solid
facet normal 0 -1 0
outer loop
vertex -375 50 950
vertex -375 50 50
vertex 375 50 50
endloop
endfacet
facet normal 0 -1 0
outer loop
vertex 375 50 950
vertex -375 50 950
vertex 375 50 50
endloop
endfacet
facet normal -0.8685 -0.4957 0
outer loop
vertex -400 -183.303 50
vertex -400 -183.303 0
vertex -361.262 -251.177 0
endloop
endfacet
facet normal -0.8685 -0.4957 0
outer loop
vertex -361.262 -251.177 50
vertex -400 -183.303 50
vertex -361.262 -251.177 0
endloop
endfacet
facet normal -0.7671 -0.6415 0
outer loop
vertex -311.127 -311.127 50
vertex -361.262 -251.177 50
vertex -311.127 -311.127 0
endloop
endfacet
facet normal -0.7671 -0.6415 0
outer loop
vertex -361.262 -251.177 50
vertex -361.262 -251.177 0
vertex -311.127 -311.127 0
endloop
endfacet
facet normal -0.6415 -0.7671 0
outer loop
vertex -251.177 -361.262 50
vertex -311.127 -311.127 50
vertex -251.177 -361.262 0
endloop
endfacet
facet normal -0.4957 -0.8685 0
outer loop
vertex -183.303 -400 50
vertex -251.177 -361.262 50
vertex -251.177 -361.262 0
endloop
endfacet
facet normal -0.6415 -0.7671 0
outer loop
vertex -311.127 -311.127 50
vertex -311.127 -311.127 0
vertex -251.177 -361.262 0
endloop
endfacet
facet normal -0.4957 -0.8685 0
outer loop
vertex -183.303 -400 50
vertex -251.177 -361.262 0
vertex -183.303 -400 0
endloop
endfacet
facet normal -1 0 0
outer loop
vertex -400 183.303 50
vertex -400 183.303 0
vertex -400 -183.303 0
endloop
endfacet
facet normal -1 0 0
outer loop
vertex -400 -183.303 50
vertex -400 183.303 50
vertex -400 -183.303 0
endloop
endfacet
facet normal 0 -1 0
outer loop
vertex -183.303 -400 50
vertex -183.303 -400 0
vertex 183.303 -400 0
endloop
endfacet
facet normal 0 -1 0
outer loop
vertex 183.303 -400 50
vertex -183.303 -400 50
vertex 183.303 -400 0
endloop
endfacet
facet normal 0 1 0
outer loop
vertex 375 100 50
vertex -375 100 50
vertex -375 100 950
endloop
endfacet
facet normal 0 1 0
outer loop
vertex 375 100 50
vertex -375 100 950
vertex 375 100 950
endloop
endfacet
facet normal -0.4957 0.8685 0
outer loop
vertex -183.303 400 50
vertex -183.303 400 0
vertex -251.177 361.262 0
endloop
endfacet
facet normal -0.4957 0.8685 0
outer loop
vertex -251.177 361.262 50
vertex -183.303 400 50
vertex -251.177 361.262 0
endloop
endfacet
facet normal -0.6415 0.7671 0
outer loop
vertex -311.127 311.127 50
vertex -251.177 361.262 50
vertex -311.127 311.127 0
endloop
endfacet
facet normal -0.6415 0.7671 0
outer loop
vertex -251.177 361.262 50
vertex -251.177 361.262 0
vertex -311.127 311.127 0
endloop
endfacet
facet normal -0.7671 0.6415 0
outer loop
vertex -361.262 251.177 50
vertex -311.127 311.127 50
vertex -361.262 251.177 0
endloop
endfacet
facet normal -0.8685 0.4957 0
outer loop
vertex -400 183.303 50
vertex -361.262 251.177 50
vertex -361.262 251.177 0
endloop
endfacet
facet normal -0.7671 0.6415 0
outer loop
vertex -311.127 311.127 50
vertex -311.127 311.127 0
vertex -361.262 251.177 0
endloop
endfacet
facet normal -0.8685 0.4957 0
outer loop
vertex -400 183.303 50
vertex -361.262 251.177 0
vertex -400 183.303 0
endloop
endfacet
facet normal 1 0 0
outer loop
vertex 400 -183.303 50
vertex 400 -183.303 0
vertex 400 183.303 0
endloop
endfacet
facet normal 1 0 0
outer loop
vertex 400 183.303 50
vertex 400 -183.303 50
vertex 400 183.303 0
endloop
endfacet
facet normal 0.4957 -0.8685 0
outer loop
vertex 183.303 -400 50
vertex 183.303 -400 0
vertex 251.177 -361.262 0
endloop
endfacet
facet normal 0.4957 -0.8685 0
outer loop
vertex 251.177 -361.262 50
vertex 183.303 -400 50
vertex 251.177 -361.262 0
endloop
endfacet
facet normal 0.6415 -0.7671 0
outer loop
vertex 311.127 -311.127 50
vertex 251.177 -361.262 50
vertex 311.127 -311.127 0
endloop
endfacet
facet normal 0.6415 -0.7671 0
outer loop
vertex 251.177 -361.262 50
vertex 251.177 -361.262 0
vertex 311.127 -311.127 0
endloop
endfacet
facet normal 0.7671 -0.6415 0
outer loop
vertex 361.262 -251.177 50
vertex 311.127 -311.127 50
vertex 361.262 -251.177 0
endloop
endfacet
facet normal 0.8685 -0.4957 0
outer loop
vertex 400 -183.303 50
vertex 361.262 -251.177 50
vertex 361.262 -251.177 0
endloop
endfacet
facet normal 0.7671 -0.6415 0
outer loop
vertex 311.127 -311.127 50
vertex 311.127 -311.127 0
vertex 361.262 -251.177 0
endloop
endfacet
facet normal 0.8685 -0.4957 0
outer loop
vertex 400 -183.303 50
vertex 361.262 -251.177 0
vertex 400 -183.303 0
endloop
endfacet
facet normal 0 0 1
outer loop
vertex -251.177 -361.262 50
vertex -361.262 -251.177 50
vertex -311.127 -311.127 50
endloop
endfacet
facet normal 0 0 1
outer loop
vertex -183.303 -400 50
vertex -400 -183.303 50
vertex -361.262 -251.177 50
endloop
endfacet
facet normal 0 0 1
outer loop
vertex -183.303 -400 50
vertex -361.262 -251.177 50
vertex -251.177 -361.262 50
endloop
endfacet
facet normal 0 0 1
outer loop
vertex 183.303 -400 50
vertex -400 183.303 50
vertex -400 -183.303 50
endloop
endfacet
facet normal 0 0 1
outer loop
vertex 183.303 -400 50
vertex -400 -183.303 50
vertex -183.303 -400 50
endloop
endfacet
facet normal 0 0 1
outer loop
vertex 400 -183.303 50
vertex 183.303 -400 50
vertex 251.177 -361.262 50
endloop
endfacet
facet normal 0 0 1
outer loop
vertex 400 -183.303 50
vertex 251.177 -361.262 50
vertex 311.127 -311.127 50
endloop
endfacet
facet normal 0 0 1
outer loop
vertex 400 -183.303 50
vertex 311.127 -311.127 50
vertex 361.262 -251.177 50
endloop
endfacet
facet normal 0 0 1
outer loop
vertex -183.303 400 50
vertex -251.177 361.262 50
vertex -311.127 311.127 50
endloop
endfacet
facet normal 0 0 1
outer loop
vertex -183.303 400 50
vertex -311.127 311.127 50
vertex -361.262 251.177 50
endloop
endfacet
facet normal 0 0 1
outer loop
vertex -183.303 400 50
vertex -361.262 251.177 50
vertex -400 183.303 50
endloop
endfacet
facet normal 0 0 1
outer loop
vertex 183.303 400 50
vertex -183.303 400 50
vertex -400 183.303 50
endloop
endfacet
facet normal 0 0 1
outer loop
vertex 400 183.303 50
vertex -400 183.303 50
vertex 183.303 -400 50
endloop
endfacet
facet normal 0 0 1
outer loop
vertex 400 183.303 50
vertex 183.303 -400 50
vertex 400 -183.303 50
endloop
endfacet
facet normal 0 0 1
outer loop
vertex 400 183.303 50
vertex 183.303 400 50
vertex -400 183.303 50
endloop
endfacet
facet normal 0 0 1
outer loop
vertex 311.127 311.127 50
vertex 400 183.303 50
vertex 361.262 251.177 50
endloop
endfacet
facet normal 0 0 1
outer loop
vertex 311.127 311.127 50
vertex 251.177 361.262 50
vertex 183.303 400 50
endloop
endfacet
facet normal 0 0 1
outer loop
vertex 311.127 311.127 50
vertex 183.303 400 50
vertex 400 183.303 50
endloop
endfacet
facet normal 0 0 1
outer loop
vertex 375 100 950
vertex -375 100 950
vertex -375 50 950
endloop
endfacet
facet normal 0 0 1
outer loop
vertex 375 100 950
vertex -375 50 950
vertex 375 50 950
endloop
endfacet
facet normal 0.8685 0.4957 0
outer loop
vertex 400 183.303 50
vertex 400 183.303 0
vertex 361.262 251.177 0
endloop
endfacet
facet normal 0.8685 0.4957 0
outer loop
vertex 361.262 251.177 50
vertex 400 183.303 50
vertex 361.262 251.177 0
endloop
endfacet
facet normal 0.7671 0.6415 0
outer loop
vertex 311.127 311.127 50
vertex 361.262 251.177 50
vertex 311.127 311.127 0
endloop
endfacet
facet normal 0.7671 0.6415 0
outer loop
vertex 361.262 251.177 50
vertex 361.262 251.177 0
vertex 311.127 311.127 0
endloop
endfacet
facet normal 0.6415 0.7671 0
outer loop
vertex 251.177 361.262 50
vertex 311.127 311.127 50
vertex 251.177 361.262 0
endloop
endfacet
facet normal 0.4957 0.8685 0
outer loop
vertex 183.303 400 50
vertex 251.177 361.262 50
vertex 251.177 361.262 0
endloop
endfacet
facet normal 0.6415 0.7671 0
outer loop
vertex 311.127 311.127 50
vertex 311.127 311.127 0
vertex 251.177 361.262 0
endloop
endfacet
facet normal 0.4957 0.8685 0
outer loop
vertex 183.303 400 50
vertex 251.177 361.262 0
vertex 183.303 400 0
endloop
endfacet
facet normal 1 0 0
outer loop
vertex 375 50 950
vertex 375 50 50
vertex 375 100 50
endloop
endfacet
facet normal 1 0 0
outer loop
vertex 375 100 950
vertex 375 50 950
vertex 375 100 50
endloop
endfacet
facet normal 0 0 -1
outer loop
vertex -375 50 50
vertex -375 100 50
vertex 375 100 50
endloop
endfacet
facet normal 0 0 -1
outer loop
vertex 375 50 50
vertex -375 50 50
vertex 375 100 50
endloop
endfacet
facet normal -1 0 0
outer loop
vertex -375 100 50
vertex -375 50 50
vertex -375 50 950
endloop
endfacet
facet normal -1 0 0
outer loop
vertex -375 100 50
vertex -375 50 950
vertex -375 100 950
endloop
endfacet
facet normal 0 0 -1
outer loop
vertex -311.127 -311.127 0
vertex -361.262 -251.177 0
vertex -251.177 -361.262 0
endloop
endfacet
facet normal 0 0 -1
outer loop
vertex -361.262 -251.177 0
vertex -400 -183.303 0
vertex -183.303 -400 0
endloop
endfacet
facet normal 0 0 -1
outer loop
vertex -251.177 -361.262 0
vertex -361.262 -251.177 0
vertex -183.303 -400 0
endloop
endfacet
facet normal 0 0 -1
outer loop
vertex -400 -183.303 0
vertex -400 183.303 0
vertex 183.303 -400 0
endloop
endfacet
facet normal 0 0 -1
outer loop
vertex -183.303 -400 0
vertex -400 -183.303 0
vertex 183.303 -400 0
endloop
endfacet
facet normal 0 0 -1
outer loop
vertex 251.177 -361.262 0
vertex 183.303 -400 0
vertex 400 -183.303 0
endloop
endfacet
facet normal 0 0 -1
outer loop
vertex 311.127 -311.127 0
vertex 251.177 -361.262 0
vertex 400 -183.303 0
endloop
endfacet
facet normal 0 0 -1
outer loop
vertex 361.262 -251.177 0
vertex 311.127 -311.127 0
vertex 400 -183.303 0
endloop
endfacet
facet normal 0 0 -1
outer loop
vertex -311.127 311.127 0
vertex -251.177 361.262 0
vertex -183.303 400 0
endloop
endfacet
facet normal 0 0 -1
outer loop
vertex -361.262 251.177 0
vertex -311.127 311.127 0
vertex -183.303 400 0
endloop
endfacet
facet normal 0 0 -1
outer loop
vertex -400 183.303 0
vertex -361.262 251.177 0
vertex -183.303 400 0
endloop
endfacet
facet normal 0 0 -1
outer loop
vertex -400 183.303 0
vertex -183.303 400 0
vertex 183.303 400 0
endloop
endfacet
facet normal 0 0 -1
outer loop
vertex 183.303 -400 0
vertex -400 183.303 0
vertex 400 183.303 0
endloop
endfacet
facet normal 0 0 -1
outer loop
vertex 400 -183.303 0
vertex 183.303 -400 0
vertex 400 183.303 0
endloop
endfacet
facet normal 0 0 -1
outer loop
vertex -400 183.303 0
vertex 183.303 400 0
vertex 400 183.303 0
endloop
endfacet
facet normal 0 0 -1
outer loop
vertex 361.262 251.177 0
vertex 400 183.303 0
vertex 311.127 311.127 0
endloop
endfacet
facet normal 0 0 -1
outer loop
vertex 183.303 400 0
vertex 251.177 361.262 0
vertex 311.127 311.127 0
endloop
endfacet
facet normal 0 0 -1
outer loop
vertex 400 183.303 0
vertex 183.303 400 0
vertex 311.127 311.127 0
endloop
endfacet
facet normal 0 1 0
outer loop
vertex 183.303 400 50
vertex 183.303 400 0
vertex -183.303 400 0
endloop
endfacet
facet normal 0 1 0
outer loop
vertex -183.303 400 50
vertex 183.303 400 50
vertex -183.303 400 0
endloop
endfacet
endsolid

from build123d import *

# Parameters (mm, degrees)
F1_DEPTH = 50
F2_W     = 750
F2_H     = 50
F3_DEPTH = 900


with BuildPart() as f1:
    # F0 (on Top) → F1 (new body)
    with BuildSketch(Plane.XY):
        with BuildLine():
            ThreePointArc((400, 183.3030277982), (311.1269837221, 311.1269837221), (183.3030277982, 400))
            Line((183.3030277982, 400), (-183.3030277982, 400))
            ThreePointArc((-183.3030277982, 400), (-311.1269837221, 311.1269837221), (-400, 183.3030277982))
            Line((-400, 183.3030277982), (-400, -183.3030277982))
            ThreePointArc((-400, -183.3030277982), (-311.1269837221, -311.1269837221), (-183.3030277982, -400))
            Line((-183.3030277982, -400), (183.3030277982, -400))
            ThreePointArc((183.3030277982, -400), (311.1269837221, -311.1269837221), (400, -183.3030277982))
            Line((400, -183.3030277982), (400, 183.3030277982))
        make_face()
    extrude(amount=F1_DEPTH)


with BuildPart() as f3:
    # F2 (on face) → F3 (new body)
    with BuildSketch(Plane.XY.offset(50)):
        with Locations((0, 75)):
            Rectangle(F2_W, F2_H)
    extrude(amount=F3_DEPTH)


solid = Compound([f1.part, f3.part])
